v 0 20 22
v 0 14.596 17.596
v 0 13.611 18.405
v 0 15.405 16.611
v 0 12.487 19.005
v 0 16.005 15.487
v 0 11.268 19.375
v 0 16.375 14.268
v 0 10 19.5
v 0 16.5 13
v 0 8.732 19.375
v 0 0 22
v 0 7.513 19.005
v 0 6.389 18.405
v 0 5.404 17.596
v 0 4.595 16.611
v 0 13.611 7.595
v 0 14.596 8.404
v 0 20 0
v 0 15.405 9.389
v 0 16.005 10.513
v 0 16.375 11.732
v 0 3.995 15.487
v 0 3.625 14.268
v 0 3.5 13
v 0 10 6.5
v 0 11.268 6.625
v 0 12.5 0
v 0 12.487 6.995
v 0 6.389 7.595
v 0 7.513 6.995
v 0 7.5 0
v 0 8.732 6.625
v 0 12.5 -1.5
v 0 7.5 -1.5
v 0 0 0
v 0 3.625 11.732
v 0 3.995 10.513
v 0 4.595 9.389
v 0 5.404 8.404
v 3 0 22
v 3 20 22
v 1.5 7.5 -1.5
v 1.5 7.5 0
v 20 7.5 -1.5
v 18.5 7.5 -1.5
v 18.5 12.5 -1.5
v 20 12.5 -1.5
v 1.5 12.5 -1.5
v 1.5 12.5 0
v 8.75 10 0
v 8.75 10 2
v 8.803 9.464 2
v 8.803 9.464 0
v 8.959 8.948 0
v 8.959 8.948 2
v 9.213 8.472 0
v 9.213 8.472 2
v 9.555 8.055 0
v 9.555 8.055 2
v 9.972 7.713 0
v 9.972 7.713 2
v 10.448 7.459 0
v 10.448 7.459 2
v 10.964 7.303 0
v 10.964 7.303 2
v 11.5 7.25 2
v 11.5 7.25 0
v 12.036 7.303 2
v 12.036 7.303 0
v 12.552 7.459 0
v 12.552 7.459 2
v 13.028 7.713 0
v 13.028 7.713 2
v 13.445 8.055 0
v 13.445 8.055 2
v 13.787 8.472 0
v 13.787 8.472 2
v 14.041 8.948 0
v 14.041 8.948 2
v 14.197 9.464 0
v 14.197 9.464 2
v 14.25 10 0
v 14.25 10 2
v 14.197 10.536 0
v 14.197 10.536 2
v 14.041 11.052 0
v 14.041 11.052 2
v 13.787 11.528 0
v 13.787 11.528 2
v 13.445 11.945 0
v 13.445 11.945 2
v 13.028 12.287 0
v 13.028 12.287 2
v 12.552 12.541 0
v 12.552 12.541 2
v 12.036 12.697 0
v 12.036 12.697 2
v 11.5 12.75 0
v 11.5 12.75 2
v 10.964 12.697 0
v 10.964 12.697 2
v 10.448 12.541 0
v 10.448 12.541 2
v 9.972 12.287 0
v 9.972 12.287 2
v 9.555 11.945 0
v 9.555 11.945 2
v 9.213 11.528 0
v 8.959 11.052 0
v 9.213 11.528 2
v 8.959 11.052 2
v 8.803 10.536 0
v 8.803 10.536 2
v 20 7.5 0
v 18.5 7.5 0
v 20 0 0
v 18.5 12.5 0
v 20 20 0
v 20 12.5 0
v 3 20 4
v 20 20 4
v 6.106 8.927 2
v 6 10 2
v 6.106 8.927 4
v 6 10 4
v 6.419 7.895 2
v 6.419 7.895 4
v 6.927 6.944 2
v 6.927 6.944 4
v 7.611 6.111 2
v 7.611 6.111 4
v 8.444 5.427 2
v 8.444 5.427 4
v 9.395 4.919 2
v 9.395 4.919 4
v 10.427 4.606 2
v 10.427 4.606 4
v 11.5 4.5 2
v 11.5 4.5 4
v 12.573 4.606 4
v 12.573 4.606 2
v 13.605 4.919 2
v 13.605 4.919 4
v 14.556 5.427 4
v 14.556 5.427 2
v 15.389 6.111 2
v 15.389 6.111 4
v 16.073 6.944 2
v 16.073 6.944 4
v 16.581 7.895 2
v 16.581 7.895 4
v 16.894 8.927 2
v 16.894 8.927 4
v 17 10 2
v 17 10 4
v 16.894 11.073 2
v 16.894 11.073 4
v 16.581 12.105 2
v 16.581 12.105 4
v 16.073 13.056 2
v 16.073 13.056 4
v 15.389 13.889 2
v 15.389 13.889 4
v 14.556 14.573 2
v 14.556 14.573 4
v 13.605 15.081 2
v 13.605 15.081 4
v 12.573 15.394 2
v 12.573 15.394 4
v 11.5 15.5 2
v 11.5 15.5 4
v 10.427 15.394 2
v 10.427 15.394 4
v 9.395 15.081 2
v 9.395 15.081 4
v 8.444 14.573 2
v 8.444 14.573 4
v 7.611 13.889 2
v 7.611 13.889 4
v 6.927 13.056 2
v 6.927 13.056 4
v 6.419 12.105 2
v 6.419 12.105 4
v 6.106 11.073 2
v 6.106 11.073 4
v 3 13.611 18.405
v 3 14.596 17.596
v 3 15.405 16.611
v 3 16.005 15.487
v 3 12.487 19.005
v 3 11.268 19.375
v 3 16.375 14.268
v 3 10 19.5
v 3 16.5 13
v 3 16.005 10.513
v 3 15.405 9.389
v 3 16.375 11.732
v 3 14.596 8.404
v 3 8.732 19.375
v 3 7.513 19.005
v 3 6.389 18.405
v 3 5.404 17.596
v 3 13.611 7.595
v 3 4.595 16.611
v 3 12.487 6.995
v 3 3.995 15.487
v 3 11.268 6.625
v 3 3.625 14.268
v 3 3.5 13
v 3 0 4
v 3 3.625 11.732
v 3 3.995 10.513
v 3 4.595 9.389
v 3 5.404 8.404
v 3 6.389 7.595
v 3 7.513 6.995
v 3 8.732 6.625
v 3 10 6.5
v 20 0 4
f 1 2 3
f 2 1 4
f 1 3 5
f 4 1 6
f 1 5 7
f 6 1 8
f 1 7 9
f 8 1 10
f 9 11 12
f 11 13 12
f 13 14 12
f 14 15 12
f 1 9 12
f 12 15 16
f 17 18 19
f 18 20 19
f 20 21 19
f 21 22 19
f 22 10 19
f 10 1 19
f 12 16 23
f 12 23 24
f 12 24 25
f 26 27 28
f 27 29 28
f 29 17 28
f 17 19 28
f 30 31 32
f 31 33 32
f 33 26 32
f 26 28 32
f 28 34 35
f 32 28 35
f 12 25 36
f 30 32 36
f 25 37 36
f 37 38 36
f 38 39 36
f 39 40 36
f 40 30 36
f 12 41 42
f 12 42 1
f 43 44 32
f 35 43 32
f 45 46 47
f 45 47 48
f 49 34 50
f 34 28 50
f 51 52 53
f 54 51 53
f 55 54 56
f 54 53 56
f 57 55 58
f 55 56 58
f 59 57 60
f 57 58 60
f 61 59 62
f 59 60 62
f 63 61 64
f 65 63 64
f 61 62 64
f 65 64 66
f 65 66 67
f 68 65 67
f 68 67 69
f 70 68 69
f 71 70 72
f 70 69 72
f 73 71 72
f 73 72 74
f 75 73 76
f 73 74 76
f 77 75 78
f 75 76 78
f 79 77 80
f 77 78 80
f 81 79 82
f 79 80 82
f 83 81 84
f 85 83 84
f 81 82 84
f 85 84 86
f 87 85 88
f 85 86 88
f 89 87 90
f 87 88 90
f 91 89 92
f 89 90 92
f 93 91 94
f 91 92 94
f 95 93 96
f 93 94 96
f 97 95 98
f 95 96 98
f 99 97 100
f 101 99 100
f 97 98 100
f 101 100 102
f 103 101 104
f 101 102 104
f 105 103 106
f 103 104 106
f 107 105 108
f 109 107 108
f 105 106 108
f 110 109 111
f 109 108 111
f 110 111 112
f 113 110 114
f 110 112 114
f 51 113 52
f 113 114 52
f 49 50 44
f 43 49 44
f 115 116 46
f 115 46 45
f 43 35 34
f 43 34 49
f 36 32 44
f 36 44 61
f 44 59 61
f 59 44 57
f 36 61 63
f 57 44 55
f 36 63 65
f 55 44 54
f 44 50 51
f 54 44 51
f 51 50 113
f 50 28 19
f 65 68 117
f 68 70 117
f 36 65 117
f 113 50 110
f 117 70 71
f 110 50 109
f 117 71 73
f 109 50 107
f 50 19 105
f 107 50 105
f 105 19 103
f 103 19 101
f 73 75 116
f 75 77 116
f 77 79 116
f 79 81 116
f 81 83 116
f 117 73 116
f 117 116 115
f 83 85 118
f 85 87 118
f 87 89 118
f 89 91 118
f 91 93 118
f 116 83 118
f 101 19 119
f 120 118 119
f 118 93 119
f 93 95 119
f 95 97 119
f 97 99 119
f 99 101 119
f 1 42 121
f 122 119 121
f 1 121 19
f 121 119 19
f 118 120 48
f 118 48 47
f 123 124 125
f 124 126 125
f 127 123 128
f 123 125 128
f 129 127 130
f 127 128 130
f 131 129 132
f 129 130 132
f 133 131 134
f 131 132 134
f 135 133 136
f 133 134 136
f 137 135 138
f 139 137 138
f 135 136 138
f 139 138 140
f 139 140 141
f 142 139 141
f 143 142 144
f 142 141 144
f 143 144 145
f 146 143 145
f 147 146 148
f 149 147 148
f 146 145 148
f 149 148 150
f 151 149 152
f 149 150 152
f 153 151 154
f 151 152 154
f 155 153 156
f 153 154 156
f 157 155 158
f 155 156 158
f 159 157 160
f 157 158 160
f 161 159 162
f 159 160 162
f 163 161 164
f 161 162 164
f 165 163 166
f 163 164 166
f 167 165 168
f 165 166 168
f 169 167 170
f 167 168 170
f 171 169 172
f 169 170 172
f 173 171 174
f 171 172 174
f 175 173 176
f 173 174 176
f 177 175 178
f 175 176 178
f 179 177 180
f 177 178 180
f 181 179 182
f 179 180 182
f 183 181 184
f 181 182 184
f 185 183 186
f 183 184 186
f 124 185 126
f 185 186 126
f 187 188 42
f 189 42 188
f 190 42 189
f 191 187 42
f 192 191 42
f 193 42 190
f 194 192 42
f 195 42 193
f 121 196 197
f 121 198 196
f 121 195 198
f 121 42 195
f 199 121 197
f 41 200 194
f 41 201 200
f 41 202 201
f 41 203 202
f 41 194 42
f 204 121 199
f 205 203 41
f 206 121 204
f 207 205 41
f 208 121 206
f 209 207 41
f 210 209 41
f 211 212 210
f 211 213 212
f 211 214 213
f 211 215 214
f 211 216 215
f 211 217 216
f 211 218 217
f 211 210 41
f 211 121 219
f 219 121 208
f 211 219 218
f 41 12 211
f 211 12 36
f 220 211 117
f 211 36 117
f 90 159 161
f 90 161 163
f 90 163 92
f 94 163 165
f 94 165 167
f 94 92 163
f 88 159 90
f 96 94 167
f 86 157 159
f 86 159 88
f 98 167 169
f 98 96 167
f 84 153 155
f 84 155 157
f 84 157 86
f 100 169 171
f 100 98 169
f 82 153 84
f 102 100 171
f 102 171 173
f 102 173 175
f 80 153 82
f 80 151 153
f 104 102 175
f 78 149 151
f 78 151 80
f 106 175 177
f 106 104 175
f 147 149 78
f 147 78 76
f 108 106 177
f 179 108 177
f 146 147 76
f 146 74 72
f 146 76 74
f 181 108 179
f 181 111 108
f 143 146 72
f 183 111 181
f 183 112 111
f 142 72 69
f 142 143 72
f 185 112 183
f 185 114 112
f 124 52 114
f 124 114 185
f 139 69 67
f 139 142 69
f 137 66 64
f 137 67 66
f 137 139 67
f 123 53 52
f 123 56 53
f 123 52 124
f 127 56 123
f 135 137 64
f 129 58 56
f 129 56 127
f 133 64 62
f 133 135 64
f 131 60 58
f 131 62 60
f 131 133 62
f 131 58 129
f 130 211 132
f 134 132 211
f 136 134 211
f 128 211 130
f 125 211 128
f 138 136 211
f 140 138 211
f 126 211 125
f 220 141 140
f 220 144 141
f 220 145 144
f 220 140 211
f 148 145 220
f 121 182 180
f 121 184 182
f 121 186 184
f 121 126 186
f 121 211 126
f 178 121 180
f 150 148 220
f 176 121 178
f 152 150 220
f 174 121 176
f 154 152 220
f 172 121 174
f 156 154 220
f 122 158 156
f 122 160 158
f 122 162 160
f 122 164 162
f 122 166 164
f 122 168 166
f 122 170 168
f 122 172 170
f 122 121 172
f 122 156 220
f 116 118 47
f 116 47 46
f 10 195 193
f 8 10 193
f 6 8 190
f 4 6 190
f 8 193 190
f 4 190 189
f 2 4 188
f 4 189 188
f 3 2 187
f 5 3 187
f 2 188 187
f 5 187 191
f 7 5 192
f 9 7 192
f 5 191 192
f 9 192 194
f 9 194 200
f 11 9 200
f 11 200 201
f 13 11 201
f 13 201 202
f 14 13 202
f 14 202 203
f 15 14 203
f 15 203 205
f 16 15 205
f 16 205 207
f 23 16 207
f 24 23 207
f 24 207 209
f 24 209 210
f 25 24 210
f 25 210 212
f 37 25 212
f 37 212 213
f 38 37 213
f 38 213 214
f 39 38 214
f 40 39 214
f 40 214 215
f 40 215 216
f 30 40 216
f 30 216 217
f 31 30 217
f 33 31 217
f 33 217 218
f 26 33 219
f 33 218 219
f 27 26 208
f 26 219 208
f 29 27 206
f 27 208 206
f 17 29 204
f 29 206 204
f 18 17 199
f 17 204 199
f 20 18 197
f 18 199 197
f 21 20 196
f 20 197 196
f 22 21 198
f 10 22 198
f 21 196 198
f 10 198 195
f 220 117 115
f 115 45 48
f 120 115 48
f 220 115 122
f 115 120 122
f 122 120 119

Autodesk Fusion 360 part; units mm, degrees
sketch "Sketch1" plane through (0, 0, 0) normal (0, 0, 1) x (1, 0, 0)
  line L0 (0, 0) -> (20, 0)
  line L1 (20, 0) -> (20, 20)
  line L2 (20, 20) -> (0, 20)
  line L3 (0, 20) -> (0, 0)
  dimension "d1" = 20
  dimension "d2" = 20
extrude "Extrude1" add sketch "Sketch1" along normal blind 4
sketch "Sketch2" plane through (0, 0, 4) normal (0, 0, 1) x (-1, 0, 0)
  line L0 (0, -20) -> (0, 0)
  line L1 (0, 0) -> (-20, 0)
  line L2 (-20, 0) -> (-20, -20)
  line L3 (-20, -20) -> (0, -20)
  line L4 (-3, -20) -> (-3, 0)
  circle A0 centre (-11.5, -10) radius 2.75
  circle A1 centre (-11.5, -10) radius 5.5
  line L5 (0, -10) -> (-20, -10) construction
  dimension "d5" = 5.5
  dimension "d6" = 11
  dimension "d7" = 3
  dimension "d8" = 3
  dimension "d9" = 3
extrude "Extrude2" cut sketch "Sketch2" against normal up to surface (4 mm away) contours A0
extrude "Extrude3" cut sketch "Sketch2" against normal blind 2 contours A1
extrude "Extrude4" add sketch "Sketch2" along normal blind 18 contours L0 L1 L3 L4
sketch "Sketch3" plane through (3, 0, 0) normal (1, 0, 0) x (0, 1, 0)
  line L0 (0, 4) -> (20, 4)
  line L1 (20, 4) -> (20, 22)
  line L2 (20, 22) -> (0, 22)
  line L3 (0, 22) -> (0, 4)
  line L4 (0, 13) -> (20, 13) construction
  line L5 (10, 22) -> (10, 4) construction
  circle A0 centre (10, 13) radius 6.5
  dimension "d16" = 13
extrude "Extrude5" cut sketch "Sketch3" against normal up to surface (3 mm away) contours A0
sketch "Sketch4" plane through (0, 0, 0) normal (0, 0, -1) x (1, 0, 0)
  circle A0 centre (11.5, -10) radius 2.75
  line L0 (0, 0) -> (0, -20)
  line L1 (0, -20) -> (20, -20)
  line L2 (20, -20) -> (20, 0)
  line L3 (20, 0) -> (0, 0)
  line L4 (0, -10) -> (20, -10) construction
  line L5 (20, -12.5) -> (18.5, -12.5)
  line L6 (18.5, -12.5) -> (18.5, -7.5)
  line L7 (18.5, -7.5) -> (20, -7.5)
  line L8 (10, -20) -> (10, 0) construction
  line L9 (0, -12.5) -> (1.5, -12.5)
  line L10 (1.5, -12.5) -> (1.5, -7.5)
  line L11 (1.5, -7.5) -> (0, -7.5)
  dimension "d19" = 5
  dimension "d20" = 1.5
  dimension "d21" = 7.5
extrude "Extrude6" add sketch "Sketch4" along normal blind 1.5 contours L0 L9 L10 L11 | L2 L5 L6 L7
